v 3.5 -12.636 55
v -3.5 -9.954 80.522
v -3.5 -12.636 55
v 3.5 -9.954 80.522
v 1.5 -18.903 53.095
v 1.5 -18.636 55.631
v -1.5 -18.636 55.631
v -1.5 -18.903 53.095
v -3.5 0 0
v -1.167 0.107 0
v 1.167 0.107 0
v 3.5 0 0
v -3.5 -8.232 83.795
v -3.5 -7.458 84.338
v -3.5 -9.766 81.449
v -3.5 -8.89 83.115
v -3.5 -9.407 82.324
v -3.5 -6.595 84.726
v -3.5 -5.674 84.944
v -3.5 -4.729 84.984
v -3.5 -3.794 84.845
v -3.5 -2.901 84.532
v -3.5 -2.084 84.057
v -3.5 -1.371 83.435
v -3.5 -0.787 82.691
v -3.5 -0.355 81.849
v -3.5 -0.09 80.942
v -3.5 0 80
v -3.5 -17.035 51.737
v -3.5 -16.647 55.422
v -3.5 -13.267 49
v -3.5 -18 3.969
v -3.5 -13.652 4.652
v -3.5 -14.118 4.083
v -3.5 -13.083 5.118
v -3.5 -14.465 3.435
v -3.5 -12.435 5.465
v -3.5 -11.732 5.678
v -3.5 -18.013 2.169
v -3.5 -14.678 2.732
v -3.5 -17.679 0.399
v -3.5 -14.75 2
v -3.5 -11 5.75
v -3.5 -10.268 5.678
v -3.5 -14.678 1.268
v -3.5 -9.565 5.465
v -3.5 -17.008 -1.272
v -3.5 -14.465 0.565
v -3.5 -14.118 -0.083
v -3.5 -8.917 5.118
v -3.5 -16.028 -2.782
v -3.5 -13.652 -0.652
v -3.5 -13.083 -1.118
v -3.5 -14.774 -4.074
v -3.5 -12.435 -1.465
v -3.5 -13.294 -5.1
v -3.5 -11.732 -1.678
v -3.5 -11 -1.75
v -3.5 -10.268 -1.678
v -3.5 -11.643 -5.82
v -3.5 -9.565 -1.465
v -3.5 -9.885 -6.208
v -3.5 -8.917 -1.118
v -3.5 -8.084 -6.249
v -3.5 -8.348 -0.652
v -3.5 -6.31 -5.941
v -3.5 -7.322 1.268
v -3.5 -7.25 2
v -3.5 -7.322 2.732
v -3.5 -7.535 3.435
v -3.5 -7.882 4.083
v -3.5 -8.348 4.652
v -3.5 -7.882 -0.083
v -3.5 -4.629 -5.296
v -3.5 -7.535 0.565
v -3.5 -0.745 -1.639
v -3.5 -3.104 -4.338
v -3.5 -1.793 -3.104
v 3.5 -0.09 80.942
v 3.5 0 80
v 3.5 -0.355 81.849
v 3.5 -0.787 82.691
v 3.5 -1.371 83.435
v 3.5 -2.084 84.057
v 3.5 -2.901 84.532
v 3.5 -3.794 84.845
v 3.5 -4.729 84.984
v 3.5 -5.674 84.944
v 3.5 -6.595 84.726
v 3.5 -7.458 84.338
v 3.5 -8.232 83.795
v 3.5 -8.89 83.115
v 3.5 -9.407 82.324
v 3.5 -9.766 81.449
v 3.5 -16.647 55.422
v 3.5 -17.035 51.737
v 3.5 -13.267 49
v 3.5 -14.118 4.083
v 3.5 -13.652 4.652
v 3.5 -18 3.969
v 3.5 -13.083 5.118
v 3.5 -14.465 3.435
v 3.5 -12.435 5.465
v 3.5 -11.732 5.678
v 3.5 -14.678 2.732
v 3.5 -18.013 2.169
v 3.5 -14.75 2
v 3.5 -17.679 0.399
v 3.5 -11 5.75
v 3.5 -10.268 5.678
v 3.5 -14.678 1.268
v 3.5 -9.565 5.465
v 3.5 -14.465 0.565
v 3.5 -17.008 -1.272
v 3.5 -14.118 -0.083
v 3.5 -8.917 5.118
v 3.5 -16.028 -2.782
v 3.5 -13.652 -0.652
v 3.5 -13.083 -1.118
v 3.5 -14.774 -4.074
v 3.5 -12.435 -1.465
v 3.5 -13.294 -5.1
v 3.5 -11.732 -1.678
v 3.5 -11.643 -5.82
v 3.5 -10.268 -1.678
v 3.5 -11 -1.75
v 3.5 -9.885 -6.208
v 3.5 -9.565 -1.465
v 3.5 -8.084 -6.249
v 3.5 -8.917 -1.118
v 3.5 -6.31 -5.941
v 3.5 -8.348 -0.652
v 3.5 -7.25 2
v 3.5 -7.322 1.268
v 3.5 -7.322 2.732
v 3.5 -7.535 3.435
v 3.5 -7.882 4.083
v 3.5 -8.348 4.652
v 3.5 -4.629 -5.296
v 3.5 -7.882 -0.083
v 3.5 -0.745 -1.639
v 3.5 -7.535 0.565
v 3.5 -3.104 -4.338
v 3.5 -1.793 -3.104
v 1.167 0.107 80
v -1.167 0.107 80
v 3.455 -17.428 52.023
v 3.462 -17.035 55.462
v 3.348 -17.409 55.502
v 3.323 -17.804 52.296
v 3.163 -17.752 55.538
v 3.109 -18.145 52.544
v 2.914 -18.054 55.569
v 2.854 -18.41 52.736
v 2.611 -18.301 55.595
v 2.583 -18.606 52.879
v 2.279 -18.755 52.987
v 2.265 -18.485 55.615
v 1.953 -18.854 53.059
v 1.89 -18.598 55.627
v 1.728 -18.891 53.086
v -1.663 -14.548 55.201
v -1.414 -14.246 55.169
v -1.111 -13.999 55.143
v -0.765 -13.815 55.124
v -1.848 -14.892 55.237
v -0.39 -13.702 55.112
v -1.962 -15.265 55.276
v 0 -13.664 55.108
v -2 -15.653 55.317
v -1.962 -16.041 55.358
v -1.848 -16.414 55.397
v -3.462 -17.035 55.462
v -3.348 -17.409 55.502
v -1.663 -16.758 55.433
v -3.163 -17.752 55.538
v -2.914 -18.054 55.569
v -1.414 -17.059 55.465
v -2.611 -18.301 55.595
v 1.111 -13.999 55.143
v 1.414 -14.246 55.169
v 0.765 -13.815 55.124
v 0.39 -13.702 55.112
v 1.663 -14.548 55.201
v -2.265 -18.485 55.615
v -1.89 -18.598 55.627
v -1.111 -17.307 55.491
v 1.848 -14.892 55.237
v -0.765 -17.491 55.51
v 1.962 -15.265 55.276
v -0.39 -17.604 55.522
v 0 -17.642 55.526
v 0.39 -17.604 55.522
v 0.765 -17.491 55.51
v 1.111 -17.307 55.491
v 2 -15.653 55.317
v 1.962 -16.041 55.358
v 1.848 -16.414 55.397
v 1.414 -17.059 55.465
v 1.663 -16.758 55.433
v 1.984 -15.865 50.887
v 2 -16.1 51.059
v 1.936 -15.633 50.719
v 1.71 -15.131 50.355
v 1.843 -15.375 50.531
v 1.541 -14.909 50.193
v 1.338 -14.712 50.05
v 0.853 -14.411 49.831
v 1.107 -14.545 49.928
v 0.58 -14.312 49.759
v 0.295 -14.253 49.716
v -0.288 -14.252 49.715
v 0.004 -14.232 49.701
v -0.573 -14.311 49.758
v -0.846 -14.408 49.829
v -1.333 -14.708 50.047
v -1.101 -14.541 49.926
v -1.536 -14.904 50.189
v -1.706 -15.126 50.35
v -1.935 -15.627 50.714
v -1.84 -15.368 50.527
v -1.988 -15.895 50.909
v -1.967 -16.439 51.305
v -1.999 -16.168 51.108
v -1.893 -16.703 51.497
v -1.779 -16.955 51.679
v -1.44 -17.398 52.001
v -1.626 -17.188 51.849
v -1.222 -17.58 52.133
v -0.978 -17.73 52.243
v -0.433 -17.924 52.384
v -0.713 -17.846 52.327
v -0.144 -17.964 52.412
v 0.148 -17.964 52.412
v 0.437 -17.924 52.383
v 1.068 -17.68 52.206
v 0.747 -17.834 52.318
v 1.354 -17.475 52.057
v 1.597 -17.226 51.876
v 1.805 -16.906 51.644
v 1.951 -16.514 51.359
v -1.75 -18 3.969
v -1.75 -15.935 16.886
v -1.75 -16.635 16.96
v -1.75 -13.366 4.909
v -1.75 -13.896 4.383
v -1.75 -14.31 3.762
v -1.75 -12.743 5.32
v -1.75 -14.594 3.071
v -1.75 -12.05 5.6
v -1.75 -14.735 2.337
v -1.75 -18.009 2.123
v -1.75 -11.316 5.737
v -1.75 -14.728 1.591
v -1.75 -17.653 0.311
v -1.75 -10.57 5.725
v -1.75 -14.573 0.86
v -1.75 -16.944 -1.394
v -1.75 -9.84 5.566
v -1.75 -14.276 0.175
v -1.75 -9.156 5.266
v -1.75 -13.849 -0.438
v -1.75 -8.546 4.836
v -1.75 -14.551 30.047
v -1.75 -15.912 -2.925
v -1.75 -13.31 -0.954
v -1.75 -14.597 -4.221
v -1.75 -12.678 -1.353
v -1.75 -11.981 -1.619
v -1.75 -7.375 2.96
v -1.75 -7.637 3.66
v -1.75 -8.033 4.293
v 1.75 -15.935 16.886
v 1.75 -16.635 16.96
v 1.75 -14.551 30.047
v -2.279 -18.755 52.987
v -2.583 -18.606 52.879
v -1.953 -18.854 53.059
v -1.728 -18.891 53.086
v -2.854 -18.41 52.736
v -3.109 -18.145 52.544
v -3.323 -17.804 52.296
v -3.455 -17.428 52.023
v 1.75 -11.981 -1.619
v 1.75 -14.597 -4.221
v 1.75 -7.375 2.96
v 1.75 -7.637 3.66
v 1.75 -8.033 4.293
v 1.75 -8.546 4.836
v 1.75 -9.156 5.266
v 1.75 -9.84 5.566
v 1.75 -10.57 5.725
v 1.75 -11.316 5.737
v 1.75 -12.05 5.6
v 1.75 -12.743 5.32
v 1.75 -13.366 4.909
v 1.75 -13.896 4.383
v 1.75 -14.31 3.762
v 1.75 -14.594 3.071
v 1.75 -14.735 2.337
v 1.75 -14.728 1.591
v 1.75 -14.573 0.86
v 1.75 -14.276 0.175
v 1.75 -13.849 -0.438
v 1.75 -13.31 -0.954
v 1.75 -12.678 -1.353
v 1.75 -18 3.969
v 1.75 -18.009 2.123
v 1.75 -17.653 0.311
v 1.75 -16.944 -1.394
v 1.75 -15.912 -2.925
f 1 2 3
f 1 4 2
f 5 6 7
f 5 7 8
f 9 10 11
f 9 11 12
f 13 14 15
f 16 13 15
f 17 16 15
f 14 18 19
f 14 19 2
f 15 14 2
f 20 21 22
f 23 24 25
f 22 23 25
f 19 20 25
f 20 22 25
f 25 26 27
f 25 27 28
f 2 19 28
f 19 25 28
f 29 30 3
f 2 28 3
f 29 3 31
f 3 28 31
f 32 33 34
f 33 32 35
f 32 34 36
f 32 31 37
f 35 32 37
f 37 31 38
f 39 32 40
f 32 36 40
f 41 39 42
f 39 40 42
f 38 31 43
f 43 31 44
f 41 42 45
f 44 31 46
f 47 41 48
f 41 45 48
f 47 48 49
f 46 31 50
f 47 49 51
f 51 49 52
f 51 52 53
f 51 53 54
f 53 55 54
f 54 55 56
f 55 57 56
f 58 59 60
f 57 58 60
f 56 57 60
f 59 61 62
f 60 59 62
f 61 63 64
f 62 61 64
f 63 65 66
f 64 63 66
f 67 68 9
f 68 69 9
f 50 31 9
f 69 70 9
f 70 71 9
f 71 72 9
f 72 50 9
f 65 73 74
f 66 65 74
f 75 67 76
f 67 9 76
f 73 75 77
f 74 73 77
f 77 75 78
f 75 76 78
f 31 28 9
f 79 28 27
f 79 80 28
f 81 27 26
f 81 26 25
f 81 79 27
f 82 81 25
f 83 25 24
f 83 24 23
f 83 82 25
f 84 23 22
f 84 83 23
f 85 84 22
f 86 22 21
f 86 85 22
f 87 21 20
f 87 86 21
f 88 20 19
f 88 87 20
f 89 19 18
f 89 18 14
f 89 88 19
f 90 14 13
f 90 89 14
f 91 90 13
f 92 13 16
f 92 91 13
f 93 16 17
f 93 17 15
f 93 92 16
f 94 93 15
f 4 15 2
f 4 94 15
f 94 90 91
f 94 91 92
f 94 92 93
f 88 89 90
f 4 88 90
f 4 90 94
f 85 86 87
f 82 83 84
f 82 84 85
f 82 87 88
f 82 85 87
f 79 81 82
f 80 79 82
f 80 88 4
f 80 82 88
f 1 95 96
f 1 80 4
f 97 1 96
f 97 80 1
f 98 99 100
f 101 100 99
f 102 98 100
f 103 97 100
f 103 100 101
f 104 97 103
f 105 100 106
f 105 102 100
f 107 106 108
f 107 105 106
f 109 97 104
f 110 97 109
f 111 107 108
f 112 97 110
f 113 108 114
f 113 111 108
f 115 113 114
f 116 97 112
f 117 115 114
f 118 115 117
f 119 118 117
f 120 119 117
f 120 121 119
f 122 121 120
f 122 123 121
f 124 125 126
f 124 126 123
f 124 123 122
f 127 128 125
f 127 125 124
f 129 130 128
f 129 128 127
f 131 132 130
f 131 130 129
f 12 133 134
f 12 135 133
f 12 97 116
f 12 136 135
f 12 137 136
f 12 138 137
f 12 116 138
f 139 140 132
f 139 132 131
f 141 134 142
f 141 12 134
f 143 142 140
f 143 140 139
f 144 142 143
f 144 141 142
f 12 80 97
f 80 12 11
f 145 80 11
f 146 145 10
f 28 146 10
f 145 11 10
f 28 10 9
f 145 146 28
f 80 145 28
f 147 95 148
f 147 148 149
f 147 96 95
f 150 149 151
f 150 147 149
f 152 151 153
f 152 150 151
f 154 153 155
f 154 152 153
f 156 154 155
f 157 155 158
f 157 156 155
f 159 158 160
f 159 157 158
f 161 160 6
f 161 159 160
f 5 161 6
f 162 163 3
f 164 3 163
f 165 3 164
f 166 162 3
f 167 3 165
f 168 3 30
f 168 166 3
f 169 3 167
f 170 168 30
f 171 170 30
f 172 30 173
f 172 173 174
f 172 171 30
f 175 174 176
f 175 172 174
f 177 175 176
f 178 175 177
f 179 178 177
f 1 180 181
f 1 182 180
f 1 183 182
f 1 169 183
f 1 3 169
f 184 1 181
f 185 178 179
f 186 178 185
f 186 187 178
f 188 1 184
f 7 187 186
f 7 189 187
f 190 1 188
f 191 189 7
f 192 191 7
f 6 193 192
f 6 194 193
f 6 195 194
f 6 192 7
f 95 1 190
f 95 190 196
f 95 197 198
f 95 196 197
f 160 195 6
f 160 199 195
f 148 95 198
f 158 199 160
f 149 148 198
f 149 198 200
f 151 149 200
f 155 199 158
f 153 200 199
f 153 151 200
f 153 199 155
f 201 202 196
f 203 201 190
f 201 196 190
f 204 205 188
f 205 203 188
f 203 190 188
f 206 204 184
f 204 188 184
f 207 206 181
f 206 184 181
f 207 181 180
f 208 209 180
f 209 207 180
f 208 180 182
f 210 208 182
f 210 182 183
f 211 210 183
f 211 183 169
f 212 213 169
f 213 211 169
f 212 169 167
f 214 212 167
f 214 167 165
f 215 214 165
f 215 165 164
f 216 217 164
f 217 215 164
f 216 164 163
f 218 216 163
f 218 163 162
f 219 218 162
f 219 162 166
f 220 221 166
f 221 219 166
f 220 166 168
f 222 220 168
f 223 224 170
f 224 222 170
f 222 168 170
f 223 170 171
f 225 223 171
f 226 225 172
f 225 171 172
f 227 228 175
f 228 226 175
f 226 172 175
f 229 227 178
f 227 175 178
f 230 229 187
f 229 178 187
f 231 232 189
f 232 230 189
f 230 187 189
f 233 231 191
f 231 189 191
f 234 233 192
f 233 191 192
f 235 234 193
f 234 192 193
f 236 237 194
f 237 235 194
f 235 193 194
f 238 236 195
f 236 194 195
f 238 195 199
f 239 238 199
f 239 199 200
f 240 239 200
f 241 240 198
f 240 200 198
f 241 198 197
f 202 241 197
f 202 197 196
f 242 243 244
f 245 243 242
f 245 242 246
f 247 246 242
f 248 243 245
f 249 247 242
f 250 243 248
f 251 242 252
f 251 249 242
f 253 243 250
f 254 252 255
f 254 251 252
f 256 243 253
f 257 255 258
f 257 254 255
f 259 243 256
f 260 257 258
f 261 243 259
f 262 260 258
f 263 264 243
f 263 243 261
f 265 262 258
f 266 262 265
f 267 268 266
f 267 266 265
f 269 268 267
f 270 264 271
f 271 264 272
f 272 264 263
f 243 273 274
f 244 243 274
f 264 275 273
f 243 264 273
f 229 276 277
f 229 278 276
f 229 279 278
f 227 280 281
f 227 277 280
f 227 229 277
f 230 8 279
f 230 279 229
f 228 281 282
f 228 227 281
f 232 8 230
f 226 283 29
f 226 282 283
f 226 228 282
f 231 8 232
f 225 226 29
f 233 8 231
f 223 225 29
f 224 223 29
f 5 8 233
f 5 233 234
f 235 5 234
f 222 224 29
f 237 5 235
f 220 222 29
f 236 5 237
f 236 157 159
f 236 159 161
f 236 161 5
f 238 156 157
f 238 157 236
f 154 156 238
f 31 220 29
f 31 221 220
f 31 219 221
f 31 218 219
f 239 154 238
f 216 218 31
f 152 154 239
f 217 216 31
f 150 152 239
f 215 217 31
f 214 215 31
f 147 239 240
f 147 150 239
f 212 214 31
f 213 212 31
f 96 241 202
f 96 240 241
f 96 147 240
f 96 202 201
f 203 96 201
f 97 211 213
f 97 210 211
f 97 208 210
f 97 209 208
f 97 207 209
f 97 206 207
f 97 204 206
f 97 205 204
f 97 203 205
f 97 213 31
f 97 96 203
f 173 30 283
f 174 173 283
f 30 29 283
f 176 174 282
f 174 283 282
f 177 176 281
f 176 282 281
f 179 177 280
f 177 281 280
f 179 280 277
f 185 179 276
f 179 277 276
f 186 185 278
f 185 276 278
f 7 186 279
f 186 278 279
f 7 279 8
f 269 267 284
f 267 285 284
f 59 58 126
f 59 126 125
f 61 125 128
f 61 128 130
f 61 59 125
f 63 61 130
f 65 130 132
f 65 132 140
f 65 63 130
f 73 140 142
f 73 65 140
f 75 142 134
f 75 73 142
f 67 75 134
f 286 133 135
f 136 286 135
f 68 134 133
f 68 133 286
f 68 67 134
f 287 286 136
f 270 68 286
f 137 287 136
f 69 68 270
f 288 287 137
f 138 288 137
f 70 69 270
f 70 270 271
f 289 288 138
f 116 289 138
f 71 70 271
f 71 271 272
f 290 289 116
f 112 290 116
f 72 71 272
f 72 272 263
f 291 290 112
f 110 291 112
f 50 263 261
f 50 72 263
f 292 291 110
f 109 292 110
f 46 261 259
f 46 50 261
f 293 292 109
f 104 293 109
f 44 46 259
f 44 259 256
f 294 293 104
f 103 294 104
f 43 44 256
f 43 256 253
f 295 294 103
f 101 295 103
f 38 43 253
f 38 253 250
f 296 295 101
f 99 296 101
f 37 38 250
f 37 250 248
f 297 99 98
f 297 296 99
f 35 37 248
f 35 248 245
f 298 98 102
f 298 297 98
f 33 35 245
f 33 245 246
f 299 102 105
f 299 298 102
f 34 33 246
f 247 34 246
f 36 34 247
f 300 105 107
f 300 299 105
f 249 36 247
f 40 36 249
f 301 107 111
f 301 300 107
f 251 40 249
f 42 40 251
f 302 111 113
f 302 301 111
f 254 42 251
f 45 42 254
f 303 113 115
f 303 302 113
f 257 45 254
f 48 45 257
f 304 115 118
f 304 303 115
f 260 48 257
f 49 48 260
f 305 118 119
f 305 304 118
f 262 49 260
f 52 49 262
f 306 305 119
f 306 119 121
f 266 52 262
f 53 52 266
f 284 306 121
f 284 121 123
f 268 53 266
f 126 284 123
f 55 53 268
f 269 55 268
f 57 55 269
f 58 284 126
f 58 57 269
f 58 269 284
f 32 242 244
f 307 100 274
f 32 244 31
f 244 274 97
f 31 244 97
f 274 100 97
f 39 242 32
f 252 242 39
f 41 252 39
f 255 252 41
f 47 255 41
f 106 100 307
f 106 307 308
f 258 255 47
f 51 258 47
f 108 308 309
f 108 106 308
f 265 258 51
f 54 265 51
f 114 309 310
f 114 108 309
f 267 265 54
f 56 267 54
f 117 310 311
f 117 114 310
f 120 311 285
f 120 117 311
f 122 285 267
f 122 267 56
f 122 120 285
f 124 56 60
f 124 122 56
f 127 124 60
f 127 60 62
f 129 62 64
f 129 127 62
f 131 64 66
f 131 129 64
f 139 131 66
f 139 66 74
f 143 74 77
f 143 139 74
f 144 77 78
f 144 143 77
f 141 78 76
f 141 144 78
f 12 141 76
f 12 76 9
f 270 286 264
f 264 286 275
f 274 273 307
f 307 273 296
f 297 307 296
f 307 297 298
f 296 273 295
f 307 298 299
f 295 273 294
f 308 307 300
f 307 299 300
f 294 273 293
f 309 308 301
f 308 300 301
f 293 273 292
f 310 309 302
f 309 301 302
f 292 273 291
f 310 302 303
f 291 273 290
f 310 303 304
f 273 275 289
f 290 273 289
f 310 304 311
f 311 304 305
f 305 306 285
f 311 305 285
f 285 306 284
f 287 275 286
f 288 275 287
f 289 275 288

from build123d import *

# Parameters (mm, degrees)
SKETCH1_R           = 3.75
BOSS_EXTRUDE1_DEPTH = 3.5
CUT_EXTRUDE1_DEPTH  = 1.75
BOSS_EXTRUDE3_DEPTH = 80
SKETCH9_R           = 2
CUT_EXTRUDE3_DEPTH  = 7
FILLET2_R           = 2
BOSS_EXTRUDE7_DEPTH = 3.5


with BuildPart() as part:
    # Sketch1 → Boss-Extrude1 (new body, symmetric)
    with BuildSketch(Plane(origin=(0, 0, 0), x_dir=(0, 0, -1), z_dir=(1, 0, 0))):
        with BuildLine():
            Line((-80.521669114, -9.954039671), (-3.96947016, -18))
            ThreePointArc((-3.96947016, -18), (6.057083574, -10.773431066), (0, 0))
            Line((0, 0), (-80, 0))
            ThreePointArc((-80, 0), (-84.983850029, -4.729497083), (-80.521669114, -9.954039671))
        make_face()
        with Locations((-2, -11)):
            Circle(SKETCH1_R, mode=Mode.SUBTRACT)
        Polygon((-53.094727027, -18.903008846), (-49, -13.267100598), (-55, -12.636475186), (-55.630625412, -18.636475186), align=None)
    extrude(amount=BOSS_EXTRUDE1_DEPTH, both=True)

    # Sketch6 → Cut-Extrude1 (cut, symmetric)
    with BuildSketch(Plane(origin=(0, 0, 0), x_dir=(0, 0, -1), z_dir=(1, 0, 0))):
        with BuildLine():
            ThreePointArc((1.619477331, -11.980756773), (-4.659098946, -13.644180931), (-2.960378385, -7.375062296))
            Line((-2.960378385, -7.375062296), (-31.959880017, -15.058089377))
            Line((-31.959880017, -15.058089377), (-3.96947016, -18))
            ThreePointArc((-3.96947016, -18), (0.558835237, -17.340846662), (4.220806393, -14.596762087))
            Line((4.220806393, -14.596762087), (1.619477331, -11.980756773))
        make_face()
    extrude(amount=CUT_EXTRUDE1_DEPTH, both=True, mode=Mode.SUBTRACT)

    # Sketch8 → Boss-Extrude3 (add)
    with BuildSketch(Plane.XY):
        with BuildLine():
            Line((-3.5, 0), (3.5, 0))
            ThreePointArc((3.5, 0), (0, 0.120714291), (-3.5, 0))
        make_face()
    extrude(amount=BOSS_EXTRUDE3_DEPTH)

    # Sketch9 → Cut-Extrude3 (cut)
    with BuildSketch(Plane(origin=(0, 5.579502847, 53.085423559), x_dir=(1, 0, 0), z_dir=(0, 0.104528463, 0.994521895))):
        with Locations((0, -21.34936641)):
            Circle(SKETCH9_R)
    extrude(amount=-CUT_EXTRUDE3_DEPTH, mode=Mode.SUBTRACT)

    # Fillet2
    fillet2_edges = [part.edges().sort_by_distance(p)[0] for p in [
        (-3.5, -18.769742016, 54.362676219),
        (3.5, -18.769742016, 54.362676219),
    ]]
    fillet(fillet2_edges, radius=FILLET2_R)

    # Sketch10 → Boss-Extrude7 (add)
    with BuildSketch(Plane.ZY.offset(-1.75)):
        Polygon((31.959880017, -15.058089377), (30.04729926, -14.551376885), (16.886307052, -15.934652906), (16.959880017, -16.634652906), align=None)
        Polygon((31.959880017, -15.058089377), (31.886307052, -14.358089377), (30.04729926, -14.551376885), align=None)
    extrude(amount=BOSS_EXTRUDE7_DEPTH)


solid = part.part
